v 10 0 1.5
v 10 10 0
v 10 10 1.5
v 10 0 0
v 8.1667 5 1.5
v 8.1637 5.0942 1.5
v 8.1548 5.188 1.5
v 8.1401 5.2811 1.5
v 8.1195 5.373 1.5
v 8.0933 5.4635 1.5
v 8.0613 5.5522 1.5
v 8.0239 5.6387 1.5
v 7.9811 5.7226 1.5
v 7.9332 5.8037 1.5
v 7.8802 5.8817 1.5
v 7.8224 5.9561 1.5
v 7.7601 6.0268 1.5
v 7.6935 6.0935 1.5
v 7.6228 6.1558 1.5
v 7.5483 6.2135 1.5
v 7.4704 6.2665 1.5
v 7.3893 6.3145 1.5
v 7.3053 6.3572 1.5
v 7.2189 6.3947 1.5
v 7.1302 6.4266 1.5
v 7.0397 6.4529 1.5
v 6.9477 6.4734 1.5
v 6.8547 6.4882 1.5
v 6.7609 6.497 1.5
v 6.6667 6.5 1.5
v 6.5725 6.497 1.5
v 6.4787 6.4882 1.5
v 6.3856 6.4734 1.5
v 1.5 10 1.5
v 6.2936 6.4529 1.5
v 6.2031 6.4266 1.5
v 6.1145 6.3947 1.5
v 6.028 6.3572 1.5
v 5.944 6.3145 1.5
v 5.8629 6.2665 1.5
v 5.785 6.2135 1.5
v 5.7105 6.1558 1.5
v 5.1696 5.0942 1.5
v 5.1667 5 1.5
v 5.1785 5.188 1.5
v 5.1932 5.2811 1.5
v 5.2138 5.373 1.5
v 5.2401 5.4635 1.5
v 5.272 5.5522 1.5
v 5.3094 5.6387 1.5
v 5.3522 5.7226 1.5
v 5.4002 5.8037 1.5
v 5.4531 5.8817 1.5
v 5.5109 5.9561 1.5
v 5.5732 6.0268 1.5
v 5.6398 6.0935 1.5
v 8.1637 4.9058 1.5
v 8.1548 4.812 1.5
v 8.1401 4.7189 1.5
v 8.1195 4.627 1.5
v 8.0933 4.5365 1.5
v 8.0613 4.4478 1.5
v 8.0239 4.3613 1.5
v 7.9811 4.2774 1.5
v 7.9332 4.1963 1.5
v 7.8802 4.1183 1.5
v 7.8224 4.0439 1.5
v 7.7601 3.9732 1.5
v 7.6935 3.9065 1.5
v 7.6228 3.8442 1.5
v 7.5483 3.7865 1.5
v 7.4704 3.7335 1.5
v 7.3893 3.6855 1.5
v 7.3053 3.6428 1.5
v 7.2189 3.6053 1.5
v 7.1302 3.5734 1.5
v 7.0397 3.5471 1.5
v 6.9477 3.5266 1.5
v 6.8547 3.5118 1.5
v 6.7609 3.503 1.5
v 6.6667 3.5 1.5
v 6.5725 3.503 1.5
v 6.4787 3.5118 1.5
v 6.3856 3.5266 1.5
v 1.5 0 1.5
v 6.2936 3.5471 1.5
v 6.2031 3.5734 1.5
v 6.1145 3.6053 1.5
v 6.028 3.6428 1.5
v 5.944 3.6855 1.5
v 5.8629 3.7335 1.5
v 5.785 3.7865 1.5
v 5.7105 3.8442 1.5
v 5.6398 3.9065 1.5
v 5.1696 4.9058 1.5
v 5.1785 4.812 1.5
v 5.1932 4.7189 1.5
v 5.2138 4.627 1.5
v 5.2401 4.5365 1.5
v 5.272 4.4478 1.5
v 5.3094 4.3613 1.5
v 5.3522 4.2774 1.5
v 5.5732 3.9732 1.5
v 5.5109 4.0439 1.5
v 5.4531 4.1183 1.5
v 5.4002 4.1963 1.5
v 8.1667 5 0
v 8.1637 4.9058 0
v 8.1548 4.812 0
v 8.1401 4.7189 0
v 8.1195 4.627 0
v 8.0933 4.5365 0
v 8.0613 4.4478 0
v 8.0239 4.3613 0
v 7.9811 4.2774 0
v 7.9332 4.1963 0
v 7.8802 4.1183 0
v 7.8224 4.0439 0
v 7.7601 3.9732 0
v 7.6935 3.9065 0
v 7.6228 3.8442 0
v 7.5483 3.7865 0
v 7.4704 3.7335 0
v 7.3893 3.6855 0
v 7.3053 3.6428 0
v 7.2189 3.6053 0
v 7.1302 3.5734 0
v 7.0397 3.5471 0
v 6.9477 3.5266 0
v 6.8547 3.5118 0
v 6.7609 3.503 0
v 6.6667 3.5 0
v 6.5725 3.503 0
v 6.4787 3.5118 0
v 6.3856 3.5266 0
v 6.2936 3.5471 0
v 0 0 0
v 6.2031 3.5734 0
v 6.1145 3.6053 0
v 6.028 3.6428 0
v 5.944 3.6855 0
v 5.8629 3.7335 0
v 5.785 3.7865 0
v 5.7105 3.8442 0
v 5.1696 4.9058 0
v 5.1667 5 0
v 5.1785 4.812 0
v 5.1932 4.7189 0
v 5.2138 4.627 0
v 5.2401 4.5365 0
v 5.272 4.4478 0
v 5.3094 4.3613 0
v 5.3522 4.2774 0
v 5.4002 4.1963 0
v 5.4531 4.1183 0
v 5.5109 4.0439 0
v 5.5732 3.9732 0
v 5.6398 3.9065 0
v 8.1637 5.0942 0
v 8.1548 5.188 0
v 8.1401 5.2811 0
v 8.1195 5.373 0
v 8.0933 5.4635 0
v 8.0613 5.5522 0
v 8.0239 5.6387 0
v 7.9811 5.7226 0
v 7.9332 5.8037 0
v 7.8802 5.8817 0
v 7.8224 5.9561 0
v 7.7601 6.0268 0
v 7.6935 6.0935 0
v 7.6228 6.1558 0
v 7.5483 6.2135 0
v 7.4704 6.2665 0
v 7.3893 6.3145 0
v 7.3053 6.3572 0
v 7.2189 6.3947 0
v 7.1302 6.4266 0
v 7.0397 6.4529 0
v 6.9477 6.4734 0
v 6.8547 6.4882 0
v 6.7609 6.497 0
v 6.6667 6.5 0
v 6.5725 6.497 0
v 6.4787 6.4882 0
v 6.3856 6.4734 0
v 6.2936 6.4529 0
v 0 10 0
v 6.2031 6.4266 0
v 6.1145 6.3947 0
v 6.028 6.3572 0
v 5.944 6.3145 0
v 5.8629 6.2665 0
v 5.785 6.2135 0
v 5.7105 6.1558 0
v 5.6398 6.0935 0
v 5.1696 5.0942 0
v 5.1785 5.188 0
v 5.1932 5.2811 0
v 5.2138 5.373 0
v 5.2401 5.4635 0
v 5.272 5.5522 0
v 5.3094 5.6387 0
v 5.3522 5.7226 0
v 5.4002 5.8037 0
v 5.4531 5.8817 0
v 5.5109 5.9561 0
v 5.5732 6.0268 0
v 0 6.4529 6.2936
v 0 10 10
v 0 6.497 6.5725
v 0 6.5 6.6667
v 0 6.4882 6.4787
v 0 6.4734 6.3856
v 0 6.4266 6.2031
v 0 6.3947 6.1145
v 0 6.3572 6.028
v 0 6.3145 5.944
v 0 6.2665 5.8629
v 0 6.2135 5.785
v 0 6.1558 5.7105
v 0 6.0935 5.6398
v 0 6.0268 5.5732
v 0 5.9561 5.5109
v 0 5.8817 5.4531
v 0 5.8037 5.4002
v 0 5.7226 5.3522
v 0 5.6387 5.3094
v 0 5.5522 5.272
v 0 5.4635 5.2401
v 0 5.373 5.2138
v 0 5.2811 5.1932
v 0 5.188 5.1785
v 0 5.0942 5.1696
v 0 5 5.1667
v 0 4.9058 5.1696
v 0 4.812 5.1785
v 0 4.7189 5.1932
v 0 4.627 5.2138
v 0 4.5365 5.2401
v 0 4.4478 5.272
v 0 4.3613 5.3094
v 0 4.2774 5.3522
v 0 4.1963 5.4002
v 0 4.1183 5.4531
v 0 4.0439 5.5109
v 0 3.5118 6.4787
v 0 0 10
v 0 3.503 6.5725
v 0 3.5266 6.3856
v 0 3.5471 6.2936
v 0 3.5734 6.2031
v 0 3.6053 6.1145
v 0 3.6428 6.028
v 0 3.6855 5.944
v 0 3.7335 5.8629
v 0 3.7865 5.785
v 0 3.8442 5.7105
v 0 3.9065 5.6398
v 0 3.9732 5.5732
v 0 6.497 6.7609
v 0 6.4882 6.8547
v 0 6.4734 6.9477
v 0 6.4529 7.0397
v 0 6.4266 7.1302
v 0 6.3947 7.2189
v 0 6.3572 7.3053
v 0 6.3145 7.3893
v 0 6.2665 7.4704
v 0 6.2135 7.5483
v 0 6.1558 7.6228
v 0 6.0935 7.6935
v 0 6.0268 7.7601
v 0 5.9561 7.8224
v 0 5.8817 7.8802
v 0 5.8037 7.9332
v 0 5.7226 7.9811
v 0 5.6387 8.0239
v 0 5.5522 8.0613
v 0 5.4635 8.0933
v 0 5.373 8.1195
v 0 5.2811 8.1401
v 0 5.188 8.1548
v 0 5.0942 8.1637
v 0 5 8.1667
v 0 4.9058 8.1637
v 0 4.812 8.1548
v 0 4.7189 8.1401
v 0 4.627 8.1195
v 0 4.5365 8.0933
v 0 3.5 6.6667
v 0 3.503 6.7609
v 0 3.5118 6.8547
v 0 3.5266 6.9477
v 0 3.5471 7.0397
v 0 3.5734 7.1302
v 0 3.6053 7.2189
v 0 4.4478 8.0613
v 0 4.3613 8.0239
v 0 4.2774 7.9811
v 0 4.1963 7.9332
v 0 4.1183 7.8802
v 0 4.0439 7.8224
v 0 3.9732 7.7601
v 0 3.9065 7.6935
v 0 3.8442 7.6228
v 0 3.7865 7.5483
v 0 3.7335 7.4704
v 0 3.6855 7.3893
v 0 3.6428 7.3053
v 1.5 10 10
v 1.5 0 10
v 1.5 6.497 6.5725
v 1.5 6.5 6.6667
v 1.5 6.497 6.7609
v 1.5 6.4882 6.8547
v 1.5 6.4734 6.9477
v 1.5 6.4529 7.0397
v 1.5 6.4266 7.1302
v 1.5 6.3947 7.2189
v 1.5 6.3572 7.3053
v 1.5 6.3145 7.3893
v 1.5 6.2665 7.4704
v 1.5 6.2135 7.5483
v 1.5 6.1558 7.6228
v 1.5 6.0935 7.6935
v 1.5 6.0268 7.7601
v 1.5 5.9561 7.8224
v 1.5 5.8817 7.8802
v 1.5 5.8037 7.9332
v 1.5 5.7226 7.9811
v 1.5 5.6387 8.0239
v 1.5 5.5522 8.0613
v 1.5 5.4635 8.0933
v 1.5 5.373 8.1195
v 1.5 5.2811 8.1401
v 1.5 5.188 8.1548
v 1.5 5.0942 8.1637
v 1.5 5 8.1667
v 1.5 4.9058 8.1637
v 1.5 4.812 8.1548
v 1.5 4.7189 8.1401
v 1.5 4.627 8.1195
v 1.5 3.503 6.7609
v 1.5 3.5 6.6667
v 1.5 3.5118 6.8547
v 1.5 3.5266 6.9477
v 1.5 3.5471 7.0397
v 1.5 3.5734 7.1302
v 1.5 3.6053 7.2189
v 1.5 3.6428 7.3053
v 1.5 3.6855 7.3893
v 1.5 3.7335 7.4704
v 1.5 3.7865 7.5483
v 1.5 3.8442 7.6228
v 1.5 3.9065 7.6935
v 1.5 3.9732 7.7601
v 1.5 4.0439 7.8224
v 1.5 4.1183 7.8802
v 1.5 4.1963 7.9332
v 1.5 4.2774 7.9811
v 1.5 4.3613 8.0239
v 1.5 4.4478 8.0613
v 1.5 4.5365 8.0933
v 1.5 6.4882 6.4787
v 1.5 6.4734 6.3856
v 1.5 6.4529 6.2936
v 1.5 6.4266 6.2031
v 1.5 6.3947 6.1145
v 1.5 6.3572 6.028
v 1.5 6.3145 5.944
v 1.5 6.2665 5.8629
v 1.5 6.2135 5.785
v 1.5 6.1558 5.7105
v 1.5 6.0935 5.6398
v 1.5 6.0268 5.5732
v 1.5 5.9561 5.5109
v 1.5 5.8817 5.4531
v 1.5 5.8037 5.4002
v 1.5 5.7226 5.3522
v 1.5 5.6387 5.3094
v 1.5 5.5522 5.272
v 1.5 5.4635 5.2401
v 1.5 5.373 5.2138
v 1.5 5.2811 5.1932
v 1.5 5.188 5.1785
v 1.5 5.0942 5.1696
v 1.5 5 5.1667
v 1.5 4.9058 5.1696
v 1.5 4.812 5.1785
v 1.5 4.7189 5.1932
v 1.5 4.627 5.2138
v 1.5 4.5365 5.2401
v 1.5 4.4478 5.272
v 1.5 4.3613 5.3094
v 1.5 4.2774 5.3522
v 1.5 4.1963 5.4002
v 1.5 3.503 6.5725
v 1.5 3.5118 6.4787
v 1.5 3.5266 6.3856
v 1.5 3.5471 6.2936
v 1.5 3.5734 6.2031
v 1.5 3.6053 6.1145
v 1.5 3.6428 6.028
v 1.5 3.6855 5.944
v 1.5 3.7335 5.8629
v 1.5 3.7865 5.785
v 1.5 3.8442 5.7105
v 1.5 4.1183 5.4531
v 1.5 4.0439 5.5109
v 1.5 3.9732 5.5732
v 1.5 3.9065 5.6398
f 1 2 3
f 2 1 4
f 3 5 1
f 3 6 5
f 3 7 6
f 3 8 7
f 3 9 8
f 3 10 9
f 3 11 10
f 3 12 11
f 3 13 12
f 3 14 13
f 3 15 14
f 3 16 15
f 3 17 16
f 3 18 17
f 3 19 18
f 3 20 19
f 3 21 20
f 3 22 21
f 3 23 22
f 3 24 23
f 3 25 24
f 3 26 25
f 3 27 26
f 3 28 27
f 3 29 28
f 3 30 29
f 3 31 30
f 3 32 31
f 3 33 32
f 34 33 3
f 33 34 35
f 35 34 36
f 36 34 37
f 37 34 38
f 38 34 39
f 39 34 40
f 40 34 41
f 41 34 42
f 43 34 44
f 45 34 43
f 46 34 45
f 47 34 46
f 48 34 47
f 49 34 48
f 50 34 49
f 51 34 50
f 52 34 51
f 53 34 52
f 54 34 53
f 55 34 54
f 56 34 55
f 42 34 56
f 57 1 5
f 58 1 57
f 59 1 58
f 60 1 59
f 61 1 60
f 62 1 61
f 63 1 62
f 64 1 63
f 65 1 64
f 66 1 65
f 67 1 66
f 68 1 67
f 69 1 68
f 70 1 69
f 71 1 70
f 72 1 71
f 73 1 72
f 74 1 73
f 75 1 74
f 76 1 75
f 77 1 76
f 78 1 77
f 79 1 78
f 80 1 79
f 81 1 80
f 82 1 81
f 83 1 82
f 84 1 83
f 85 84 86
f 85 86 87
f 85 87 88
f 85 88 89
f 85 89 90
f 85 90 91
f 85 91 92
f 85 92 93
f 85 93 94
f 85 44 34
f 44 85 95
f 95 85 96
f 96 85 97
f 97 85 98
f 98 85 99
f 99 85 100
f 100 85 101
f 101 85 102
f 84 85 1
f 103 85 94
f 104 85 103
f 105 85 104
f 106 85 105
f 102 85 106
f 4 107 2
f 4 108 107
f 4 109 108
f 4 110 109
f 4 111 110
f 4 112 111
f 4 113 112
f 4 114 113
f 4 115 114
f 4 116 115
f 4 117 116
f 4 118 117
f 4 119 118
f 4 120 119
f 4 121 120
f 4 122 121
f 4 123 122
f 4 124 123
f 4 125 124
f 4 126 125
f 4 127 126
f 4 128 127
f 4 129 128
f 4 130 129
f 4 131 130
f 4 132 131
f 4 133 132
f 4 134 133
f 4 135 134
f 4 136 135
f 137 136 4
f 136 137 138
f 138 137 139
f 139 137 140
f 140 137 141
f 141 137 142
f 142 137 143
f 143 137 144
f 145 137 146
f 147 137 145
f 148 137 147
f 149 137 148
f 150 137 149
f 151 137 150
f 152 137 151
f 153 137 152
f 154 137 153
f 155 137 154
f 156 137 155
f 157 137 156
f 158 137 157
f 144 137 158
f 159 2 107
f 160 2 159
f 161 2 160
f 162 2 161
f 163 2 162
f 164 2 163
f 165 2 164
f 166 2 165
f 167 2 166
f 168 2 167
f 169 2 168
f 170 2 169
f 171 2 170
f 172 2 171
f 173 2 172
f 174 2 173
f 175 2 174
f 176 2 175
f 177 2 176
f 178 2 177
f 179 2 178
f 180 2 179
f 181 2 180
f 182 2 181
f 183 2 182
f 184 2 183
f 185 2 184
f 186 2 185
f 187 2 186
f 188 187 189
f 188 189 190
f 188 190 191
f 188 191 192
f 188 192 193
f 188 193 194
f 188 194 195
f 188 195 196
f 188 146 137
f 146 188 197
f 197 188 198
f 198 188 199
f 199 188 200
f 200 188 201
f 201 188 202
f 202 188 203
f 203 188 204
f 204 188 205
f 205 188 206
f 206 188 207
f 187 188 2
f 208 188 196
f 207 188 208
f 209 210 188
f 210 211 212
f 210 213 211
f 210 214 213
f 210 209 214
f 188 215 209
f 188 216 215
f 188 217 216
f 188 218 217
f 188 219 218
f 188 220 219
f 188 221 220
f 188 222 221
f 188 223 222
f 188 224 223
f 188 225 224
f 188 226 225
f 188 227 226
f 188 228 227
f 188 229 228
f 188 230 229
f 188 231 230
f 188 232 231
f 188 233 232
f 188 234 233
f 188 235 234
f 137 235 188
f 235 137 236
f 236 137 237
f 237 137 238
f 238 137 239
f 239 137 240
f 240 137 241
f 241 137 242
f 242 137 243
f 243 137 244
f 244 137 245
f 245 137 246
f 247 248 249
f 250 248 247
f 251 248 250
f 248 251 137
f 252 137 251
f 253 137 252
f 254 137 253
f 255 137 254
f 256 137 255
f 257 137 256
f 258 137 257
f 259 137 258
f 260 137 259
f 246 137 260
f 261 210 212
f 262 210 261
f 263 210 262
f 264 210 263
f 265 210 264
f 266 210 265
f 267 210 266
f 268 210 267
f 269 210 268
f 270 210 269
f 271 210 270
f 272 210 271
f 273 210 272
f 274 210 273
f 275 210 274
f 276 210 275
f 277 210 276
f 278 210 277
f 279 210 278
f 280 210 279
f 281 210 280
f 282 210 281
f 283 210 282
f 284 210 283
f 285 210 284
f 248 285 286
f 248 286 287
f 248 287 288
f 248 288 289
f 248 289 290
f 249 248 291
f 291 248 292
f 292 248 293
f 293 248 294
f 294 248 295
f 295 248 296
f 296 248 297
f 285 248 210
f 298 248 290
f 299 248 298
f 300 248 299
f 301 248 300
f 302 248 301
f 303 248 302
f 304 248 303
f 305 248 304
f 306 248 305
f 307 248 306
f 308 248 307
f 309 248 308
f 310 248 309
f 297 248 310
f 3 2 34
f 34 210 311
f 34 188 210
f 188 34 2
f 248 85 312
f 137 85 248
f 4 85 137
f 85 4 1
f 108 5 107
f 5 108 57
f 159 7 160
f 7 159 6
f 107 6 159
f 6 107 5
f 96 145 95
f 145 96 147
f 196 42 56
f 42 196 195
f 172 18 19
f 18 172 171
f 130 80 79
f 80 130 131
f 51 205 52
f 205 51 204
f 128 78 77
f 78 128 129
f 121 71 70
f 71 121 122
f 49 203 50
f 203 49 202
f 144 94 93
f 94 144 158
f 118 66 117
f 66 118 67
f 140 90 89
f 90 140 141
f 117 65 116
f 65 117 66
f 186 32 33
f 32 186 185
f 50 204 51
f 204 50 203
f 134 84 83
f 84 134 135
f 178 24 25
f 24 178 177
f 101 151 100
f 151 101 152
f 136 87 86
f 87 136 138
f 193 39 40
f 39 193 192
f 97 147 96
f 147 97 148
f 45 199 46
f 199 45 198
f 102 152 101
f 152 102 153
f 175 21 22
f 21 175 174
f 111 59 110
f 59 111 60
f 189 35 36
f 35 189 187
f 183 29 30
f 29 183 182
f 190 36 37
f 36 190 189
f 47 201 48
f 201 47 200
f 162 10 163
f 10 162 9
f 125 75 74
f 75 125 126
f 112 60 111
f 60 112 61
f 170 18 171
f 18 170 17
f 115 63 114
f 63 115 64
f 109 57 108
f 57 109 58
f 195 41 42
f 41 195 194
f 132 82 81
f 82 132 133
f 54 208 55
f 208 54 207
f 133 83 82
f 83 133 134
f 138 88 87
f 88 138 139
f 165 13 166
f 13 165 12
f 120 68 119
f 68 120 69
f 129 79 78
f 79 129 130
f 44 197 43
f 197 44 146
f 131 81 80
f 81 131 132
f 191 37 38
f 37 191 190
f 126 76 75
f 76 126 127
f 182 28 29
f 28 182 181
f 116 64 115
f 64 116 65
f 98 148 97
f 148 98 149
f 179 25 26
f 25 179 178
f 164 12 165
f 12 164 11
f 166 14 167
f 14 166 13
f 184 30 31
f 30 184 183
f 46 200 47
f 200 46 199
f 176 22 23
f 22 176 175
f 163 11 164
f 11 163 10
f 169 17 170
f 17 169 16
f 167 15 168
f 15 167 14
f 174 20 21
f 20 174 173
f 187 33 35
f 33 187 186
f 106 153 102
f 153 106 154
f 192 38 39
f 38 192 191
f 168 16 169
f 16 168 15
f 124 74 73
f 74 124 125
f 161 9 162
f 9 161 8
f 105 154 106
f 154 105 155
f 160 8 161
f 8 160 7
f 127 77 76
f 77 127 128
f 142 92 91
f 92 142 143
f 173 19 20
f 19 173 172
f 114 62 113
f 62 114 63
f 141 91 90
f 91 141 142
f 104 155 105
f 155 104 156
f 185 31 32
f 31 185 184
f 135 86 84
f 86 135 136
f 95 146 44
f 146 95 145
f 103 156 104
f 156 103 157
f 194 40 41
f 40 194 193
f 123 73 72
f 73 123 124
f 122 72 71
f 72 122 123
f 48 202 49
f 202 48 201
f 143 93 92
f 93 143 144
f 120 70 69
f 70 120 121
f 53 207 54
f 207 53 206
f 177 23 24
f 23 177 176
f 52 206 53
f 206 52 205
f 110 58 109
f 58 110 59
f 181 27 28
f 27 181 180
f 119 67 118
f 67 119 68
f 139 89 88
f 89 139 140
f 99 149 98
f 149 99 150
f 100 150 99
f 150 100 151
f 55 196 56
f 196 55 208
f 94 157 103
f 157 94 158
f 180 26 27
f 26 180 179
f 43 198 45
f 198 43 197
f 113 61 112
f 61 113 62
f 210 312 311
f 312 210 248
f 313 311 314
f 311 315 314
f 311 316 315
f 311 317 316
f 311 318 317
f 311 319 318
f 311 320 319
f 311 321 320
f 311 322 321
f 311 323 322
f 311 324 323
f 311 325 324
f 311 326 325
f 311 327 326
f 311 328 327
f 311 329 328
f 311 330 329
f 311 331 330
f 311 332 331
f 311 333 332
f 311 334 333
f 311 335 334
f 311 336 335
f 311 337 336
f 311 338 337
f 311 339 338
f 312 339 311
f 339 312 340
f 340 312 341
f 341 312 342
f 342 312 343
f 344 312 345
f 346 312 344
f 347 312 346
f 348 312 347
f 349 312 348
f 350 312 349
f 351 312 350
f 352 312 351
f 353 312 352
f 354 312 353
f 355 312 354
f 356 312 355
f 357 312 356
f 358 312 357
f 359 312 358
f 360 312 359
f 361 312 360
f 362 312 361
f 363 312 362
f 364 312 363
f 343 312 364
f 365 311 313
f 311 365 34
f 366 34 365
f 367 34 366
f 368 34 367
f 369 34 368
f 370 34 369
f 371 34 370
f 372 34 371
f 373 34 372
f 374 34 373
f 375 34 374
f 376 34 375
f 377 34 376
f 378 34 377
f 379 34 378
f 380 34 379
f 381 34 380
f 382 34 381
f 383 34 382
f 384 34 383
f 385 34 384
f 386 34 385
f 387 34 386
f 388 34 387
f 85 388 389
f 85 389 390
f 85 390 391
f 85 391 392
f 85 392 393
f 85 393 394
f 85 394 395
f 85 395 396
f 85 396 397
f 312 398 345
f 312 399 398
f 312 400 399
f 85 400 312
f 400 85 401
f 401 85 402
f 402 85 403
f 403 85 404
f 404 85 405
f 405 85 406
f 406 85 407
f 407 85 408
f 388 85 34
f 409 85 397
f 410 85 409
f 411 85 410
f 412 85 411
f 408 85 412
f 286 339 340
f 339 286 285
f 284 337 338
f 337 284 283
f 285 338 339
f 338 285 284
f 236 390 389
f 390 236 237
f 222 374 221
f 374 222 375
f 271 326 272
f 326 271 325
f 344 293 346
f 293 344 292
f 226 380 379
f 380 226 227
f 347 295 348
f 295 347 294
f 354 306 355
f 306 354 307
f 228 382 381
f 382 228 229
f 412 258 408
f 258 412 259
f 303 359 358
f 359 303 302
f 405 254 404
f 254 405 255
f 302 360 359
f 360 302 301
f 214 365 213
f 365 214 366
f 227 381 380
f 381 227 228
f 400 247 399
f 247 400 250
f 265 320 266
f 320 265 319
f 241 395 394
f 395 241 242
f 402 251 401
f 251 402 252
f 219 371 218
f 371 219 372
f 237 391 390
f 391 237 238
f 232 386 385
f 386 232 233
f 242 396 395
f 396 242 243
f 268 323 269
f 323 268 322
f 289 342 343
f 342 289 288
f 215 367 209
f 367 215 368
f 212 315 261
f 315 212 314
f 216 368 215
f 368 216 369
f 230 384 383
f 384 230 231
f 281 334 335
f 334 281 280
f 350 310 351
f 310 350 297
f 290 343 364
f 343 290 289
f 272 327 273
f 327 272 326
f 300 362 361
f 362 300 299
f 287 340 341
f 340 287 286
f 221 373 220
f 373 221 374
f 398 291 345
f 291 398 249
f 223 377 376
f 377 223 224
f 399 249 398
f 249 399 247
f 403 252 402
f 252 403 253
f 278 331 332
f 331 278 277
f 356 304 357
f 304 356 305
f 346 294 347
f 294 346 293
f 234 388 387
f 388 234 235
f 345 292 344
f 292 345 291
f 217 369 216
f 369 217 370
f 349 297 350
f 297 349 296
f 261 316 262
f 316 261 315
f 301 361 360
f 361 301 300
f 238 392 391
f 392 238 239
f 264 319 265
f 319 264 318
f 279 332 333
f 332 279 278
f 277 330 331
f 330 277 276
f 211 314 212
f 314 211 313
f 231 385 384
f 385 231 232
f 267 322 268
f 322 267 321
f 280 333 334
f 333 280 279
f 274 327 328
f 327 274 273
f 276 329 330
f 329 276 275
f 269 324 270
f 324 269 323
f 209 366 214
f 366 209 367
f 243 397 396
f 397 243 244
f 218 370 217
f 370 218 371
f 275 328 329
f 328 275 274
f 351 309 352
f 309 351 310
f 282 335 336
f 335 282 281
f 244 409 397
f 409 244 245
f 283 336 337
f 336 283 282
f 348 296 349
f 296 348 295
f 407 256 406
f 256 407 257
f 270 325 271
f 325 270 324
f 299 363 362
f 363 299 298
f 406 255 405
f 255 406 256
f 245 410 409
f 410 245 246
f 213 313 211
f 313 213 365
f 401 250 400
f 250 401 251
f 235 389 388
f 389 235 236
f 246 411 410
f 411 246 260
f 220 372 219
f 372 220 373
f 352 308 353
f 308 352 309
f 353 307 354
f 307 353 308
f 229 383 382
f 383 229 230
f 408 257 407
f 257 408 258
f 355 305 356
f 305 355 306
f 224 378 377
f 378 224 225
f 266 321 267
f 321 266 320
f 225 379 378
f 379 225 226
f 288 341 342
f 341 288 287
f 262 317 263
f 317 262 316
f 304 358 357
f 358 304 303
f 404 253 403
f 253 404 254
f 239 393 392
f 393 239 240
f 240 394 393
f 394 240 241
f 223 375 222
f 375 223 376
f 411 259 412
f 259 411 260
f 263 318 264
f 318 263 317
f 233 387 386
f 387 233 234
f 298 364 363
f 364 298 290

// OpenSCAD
// makerbeam 90 degrees cornerbracket

width=10;
length=10;
height=1.5;
tapradius=3/2;
$fn=100;

module tap() {
 translate([length/1.5,width/2,-height]) cylinder(r=tapradius,h=3*height);
}

module wing() {
 difference() {
  cube([length, width,height]);
  tap();
 }
}

module cornerbracket() {
 wing();
 translate([height,0,0]) rotate([0,-90,0]) wing();
}

cornerbracket();
